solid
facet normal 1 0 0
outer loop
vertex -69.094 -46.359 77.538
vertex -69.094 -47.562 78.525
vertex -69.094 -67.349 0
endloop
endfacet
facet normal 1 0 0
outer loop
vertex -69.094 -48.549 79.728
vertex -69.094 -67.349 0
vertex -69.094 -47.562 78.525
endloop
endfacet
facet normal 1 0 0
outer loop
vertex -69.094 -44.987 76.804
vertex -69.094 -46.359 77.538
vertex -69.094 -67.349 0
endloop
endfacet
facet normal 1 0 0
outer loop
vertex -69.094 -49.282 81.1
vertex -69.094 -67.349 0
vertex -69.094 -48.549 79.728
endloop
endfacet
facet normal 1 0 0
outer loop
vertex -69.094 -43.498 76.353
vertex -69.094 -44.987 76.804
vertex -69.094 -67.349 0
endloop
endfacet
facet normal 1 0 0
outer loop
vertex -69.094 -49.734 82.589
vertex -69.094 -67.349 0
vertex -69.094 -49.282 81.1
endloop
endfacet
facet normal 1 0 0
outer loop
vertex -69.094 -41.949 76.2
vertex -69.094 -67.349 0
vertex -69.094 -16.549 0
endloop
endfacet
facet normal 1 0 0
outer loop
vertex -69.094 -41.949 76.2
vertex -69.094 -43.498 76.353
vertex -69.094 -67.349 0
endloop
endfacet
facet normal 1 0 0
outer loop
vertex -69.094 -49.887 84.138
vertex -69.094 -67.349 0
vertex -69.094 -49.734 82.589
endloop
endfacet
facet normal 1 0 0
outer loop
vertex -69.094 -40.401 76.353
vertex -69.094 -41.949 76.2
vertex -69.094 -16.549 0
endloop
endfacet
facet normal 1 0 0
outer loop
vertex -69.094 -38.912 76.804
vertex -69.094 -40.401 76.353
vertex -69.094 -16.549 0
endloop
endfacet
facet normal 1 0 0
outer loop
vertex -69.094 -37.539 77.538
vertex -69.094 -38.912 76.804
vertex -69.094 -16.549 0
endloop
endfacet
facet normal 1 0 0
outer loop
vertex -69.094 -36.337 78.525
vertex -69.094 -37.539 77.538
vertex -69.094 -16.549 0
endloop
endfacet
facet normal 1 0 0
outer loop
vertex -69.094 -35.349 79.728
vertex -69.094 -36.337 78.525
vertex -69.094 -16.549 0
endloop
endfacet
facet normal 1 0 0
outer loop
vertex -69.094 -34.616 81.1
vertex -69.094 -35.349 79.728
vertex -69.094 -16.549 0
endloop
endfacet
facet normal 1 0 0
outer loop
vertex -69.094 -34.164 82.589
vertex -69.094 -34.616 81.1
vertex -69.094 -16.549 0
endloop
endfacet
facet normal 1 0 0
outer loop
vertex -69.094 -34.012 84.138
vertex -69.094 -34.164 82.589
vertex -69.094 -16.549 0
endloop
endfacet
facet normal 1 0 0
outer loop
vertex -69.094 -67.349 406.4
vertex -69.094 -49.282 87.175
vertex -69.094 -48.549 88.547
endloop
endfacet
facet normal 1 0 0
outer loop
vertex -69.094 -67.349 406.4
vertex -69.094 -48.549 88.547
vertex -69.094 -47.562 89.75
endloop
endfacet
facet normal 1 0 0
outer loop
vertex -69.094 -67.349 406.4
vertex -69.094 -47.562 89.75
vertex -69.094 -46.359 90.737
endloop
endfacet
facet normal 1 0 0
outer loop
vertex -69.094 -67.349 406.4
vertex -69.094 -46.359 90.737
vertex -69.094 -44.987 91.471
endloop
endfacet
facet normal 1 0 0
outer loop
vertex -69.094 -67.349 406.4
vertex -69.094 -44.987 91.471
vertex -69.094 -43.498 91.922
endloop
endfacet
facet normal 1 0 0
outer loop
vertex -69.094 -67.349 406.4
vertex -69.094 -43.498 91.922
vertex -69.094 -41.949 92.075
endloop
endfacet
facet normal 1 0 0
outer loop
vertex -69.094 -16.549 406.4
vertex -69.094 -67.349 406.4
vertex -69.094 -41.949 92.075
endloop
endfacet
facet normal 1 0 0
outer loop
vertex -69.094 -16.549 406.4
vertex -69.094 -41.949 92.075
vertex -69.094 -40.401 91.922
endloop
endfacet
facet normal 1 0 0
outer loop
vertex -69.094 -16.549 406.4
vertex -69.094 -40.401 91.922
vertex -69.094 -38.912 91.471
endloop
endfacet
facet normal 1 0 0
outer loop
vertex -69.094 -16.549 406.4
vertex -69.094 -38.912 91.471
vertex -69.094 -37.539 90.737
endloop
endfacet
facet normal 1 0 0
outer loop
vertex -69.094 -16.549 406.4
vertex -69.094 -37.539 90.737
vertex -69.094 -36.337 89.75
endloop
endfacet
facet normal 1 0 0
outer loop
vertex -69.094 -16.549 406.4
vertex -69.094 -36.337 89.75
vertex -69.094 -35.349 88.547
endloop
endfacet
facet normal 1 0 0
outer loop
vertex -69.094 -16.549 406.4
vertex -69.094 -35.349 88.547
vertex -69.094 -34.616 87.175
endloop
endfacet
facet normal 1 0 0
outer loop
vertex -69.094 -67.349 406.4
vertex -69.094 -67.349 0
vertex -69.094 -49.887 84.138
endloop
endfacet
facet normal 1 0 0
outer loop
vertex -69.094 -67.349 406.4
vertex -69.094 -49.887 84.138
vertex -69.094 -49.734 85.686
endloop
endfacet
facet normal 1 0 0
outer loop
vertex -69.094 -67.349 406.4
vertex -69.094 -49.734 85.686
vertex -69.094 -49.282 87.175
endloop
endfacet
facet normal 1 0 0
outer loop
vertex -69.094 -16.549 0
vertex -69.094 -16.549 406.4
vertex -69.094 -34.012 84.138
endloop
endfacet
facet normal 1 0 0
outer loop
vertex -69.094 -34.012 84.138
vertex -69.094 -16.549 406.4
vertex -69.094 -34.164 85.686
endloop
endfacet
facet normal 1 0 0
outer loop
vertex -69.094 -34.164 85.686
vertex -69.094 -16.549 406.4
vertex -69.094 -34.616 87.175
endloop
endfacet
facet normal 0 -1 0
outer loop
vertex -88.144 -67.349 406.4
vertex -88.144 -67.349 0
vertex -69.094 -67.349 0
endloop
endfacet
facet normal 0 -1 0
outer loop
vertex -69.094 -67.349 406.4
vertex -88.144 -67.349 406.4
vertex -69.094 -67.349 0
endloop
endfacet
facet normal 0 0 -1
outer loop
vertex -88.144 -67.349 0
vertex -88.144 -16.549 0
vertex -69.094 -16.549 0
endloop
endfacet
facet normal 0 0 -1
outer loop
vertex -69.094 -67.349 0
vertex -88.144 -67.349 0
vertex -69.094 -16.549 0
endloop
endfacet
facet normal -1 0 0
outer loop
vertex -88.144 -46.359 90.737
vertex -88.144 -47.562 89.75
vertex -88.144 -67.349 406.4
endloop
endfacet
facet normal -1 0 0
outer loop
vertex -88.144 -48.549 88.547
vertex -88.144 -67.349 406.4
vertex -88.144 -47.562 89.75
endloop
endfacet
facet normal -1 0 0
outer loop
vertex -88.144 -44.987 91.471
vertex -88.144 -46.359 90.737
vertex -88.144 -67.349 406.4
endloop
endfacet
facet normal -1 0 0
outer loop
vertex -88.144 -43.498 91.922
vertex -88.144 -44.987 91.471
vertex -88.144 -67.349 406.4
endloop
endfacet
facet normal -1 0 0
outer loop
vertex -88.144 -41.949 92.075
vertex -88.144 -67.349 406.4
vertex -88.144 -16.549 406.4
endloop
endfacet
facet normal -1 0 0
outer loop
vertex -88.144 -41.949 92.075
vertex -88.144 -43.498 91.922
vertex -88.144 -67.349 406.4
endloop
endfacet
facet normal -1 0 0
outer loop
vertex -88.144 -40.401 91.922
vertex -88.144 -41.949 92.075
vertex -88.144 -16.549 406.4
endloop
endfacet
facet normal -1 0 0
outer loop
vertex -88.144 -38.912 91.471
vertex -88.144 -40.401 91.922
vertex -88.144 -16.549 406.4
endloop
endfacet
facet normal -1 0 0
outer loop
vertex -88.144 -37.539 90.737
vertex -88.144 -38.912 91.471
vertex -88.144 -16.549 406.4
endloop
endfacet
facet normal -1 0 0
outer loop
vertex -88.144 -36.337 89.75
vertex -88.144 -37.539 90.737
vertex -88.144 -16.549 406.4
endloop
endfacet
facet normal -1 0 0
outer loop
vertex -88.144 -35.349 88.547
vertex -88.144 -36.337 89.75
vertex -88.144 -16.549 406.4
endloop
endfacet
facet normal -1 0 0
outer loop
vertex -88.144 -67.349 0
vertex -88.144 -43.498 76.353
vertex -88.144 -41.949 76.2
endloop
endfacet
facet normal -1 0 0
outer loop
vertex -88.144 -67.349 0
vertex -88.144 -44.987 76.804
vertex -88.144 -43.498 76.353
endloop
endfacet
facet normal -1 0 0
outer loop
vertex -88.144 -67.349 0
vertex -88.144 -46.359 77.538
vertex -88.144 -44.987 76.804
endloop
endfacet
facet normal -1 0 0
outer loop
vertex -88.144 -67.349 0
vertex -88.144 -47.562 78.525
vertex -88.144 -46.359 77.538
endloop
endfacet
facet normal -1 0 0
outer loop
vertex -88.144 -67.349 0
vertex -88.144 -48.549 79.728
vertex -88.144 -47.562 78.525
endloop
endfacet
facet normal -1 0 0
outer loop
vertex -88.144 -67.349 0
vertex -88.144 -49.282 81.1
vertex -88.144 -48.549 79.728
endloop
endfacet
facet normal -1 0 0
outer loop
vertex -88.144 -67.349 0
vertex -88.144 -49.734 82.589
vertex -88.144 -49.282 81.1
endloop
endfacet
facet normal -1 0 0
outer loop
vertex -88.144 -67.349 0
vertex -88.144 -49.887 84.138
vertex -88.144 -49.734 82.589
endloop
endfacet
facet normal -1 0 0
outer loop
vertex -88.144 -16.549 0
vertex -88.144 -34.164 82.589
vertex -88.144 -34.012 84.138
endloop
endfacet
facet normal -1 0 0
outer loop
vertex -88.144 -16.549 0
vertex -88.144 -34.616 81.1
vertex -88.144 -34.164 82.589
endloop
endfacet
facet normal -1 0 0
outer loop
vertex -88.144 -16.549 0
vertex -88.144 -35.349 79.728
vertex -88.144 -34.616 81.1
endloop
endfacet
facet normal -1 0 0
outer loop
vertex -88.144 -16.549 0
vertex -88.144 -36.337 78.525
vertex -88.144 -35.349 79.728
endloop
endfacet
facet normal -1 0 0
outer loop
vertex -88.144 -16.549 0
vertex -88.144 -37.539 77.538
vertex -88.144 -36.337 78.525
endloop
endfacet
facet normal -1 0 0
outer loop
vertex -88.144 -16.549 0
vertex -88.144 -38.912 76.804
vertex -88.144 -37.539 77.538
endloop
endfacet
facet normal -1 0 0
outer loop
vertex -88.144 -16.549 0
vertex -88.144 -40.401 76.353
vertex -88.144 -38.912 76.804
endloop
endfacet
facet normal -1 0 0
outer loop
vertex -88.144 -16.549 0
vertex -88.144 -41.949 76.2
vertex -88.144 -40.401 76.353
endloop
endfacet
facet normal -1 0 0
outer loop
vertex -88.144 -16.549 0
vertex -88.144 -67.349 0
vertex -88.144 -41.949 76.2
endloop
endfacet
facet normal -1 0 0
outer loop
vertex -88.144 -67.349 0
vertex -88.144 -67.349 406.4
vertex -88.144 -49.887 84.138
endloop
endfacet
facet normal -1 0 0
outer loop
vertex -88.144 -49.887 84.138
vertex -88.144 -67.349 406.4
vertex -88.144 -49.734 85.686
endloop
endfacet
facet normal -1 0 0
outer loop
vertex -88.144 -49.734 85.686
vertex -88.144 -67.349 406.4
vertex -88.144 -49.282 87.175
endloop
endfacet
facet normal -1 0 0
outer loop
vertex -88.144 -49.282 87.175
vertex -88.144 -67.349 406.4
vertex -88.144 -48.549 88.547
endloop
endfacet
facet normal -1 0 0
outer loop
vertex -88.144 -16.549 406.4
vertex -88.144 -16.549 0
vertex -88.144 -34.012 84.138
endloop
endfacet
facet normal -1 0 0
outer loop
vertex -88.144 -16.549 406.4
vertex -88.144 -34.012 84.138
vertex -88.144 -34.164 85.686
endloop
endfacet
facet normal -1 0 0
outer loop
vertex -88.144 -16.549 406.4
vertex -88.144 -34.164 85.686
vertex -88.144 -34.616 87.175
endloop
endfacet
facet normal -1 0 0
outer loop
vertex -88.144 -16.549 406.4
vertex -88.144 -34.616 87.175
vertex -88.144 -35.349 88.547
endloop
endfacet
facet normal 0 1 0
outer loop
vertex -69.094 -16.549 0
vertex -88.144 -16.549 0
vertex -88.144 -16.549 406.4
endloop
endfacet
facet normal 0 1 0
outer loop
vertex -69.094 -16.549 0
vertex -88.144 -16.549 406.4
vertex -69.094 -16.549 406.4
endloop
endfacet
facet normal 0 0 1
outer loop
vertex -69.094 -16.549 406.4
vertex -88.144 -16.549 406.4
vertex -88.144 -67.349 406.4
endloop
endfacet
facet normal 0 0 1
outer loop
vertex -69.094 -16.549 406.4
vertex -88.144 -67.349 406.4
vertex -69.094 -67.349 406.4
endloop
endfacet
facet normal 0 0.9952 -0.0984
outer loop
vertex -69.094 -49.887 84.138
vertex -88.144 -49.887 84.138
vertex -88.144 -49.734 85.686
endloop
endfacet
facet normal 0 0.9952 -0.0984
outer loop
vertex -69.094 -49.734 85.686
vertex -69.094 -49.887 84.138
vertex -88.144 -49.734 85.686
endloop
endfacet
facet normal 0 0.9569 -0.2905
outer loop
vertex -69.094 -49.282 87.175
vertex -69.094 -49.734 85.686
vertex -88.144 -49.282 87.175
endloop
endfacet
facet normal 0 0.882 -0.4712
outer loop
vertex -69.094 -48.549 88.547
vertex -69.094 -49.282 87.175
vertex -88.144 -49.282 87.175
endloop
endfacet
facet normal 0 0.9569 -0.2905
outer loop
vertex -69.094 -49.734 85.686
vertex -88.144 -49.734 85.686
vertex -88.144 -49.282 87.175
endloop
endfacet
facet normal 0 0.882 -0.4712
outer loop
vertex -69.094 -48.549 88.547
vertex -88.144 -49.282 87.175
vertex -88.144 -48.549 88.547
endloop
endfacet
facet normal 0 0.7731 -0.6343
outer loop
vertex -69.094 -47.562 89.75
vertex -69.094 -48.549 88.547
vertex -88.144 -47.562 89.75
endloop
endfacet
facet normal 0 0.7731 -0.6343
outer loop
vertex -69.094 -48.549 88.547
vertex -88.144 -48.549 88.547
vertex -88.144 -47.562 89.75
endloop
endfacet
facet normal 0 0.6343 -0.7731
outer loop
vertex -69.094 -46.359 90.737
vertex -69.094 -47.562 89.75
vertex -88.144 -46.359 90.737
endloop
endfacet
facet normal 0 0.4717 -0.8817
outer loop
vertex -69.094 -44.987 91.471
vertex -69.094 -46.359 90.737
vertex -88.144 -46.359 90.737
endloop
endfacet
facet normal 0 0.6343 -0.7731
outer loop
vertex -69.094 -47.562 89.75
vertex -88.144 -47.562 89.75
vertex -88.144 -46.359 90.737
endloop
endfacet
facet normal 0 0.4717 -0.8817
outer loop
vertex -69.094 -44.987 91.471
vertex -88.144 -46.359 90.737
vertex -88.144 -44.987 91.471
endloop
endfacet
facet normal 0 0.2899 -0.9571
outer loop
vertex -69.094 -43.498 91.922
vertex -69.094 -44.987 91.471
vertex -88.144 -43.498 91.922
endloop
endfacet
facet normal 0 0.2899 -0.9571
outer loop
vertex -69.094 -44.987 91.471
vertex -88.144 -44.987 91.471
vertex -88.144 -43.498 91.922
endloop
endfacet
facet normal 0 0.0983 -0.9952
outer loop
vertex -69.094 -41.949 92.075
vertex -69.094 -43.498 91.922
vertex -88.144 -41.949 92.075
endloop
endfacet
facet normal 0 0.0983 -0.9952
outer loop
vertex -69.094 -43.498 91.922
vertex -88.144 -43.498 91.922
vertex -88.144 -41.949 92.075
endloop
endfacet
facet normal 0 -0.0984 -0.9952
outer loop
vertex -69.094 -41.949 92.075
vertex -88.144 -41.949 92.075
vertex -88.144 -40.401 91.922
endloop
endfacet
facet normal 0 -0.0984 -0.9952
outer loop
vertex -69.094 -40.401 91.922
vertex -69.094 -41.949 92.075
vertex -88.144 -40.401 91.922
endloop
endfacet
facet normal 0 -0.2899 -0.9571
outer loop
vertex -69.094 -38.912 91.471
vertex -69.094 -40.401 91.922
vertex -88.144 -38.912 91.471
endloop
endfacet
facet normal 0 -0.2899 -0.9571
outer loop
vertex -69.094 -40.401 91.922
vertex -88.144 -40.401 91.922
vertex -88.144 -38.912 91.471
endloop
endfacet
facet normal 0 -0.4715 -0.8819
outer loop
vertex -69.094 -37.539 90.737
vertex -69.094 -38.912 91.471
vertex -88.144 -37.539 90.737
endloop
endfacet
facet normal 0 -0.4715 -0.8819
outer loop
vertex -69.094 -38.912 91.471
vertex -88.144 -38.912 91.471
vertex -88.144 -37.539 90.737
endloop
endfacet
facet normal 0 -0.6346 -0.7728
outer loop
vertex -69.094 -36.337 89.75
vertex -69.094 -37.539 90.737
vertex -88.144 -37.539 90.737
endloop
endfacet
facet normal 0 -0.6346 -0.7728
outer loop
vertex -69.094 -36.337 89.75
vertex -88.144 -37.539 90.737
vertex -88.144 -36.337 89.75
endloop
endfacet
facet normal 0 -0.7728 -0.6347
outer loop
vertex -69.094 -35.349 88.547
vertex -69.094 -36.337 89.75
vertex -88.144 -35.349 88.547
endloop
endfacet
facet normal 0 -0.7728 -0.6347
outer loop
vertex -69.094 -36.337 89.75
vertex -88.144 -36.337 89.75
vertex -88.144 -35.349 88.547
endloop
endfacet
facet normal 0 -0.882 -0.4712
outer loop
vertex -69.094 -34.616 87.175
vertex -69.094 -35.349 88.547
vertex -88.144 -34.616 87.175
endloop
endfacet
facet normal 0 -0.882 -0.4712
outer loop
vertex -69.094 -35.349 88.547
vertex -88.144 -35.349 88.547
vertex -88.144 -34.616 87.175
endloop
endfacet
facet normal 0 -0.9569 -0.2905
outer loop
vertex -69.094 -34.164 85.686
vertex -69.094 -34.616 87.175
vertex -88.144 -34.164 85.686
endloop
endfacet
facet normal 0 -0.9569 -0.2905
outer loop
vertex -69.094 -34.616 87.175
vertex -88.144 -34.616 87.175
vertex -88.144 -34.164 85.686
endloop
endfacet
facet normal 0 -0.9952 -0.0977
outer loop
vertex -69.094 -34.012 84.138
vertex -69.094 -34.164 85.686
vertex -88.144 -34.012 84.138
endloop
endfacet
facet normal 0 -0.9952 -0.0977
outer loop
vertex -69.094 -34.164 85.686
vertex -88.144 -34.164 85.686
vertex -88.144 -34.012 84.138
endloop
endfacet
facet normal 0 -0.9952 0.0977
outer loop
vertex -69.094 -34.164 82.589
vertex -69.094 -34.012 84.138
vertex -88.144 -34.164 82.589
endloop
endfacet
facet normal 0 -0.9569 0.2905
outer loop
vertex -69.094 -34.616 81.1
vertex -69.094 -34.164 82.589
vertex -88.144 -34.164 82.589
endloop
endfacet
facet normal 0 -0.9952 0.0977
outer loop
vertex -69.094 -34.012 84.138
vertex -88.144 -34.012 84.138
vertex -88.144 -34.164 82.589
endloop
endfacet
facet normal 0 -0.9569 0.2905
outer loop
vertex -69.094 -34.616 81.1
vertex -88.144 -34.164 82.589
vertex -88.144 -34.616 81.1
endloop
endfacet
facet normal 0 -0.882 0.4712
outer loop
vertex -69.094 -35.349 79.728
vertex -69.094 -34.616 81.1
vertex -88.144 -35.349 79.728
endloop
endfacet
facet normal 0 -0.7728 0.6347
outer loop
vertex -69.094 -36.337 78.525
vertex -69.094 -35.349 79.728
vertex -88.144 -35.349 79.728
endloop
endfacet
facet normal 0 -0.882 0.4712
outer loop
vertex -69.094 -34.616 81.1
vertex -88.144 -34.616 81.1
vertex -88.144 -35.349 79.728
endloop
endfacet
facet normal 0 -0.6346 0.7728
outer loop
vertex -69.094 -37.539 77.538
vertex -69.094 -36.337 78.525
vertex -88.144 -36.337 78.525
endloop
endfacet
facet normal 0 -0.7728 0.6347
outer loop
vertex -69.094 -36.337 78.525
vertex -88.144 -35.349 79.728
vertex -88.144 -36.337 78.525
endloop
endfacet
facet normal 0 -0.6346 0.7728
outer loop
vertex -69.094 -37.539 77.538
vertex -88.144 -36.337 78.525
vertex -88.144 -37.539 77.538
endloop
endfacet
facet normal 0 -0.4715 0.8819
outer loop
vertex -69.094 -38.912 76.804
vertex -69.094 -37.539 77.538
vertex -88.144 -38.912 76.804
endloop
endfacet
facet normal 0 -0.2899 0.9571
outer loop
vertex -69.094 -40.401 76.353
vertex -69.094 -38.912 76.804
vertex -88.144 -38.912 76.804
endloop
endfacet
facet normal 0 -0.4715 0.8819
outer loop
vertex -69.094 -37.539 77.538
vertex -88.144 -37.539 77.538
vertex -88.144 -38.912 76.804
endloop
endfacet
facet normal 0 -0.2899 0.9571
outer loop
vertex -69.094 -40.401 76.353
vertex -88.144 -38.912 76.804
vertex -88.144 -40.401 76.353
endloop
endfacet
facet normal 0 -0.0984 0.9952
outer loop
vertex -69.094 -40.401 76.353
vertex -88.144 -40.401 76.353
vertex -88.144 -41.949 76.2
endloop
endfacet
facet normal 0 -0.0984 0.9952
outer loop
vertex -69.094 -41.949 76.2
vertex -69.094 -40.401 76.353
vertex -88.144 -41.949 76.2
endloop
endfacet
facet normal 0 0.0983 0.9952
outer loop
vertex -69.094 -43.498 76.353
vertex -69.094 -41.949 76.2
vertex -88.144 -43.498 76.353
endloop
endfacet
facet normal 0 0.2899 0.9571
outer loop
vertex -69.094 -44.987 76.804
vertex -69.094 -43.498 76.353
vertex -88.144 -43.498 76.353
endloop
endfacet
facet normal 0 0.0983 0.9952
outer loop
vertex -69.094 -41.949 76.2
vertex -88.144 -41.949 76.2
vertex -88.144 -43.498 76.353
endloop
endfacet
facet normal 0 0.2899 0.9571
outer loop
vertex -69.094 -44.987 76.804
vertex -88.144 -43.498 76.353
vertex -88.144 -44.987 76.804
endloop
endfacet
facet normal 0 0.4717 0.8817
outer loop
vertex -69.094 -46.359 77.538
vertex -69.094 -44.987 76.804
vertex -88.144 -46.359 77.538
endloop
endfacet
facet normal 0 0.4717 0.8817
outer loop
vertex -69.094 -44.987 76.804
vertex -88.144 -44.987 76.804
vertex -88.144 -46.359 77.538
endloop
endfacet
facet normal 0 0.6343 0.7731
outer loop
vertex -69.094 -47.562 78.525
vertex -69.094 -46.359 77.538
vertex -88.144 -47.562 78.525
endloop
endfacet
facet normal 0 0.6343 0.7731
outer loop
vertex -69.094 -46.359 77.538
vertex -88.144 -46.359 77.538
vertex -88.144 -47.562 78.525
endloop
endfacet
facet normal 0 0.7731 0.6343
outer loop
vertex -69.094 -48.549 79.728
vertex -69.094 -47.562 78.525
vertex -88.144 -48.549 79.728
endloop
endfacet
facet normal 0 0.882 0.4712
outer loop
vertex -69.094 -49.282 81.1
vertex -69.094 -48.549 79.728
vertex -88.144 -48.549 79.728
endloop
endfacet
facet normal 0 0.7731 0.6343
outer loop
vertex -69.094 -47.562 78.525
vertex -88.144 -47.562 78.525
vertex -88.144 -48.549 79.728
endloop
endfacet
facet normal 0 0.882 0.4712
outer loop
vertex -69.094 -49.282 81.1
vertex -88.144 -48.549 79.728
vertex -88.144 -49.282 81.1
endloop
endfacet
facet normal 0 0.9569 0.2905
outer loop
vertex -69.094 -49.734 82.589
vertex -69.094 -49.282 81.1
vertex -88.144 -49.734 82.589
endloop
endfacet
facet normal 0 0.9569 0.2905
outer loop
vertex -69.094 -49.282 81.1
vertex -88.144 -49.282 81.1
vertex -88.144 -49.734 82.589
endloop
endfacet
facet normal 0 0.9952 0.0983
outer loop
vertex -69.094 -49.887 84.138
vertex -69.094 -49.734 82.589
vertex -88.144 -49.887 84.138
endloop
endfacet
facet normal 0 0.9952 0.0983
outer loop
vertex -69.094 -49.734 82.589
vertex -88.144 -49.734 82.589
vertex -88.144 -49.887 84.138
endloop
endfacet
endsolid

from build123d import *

# Parameters (mm, degrees)
F0_W      = 50.8
F0_H      = 50.8
F1_DEPTH  = 406.4
F1_FACE_W = 50.8
F1_FACE_H = 406.4
F2_DEPTH  = 31.75
F3_R      = 7.9375
F4_DEPTH  = 19.05


with BuildPart() as f1:
    # F0 (on Top) → F1 (new body)
    with BuildSketch(Plane.XY):
        with Locations((-62.744076, -41.949181)):
            Rectangle(F0_W, F0_H)
    extrude(amount=F1_DEPTH)

    # F1_face (on face) → F2 (cut)
    with BuildSketch(Plane(origin=(-37.344076, -41.949181, 203.2), x_dir=(0, 1, 0), z_dir=(1, 0, 0))):
        Rectangle(F1_FACE_W, F1_FACE_H)
    extrude(amount=-F2_DEPTH, mode=Mode.SUBTRACT)

    # F3 (on face) → F4 (cut)
    with BuildSketch(Plane(origin=(-88.144076, 0, 0), x_dir=(0, -1, 0), z_dir=(-1, 0, 0))):
        with Locations((41.949181, 84.1375)):
            Circle(F3_R)
    extrude(amount=-F4_DEPTH, mode=Mode.SUBTRACT)


solid = f1.part
